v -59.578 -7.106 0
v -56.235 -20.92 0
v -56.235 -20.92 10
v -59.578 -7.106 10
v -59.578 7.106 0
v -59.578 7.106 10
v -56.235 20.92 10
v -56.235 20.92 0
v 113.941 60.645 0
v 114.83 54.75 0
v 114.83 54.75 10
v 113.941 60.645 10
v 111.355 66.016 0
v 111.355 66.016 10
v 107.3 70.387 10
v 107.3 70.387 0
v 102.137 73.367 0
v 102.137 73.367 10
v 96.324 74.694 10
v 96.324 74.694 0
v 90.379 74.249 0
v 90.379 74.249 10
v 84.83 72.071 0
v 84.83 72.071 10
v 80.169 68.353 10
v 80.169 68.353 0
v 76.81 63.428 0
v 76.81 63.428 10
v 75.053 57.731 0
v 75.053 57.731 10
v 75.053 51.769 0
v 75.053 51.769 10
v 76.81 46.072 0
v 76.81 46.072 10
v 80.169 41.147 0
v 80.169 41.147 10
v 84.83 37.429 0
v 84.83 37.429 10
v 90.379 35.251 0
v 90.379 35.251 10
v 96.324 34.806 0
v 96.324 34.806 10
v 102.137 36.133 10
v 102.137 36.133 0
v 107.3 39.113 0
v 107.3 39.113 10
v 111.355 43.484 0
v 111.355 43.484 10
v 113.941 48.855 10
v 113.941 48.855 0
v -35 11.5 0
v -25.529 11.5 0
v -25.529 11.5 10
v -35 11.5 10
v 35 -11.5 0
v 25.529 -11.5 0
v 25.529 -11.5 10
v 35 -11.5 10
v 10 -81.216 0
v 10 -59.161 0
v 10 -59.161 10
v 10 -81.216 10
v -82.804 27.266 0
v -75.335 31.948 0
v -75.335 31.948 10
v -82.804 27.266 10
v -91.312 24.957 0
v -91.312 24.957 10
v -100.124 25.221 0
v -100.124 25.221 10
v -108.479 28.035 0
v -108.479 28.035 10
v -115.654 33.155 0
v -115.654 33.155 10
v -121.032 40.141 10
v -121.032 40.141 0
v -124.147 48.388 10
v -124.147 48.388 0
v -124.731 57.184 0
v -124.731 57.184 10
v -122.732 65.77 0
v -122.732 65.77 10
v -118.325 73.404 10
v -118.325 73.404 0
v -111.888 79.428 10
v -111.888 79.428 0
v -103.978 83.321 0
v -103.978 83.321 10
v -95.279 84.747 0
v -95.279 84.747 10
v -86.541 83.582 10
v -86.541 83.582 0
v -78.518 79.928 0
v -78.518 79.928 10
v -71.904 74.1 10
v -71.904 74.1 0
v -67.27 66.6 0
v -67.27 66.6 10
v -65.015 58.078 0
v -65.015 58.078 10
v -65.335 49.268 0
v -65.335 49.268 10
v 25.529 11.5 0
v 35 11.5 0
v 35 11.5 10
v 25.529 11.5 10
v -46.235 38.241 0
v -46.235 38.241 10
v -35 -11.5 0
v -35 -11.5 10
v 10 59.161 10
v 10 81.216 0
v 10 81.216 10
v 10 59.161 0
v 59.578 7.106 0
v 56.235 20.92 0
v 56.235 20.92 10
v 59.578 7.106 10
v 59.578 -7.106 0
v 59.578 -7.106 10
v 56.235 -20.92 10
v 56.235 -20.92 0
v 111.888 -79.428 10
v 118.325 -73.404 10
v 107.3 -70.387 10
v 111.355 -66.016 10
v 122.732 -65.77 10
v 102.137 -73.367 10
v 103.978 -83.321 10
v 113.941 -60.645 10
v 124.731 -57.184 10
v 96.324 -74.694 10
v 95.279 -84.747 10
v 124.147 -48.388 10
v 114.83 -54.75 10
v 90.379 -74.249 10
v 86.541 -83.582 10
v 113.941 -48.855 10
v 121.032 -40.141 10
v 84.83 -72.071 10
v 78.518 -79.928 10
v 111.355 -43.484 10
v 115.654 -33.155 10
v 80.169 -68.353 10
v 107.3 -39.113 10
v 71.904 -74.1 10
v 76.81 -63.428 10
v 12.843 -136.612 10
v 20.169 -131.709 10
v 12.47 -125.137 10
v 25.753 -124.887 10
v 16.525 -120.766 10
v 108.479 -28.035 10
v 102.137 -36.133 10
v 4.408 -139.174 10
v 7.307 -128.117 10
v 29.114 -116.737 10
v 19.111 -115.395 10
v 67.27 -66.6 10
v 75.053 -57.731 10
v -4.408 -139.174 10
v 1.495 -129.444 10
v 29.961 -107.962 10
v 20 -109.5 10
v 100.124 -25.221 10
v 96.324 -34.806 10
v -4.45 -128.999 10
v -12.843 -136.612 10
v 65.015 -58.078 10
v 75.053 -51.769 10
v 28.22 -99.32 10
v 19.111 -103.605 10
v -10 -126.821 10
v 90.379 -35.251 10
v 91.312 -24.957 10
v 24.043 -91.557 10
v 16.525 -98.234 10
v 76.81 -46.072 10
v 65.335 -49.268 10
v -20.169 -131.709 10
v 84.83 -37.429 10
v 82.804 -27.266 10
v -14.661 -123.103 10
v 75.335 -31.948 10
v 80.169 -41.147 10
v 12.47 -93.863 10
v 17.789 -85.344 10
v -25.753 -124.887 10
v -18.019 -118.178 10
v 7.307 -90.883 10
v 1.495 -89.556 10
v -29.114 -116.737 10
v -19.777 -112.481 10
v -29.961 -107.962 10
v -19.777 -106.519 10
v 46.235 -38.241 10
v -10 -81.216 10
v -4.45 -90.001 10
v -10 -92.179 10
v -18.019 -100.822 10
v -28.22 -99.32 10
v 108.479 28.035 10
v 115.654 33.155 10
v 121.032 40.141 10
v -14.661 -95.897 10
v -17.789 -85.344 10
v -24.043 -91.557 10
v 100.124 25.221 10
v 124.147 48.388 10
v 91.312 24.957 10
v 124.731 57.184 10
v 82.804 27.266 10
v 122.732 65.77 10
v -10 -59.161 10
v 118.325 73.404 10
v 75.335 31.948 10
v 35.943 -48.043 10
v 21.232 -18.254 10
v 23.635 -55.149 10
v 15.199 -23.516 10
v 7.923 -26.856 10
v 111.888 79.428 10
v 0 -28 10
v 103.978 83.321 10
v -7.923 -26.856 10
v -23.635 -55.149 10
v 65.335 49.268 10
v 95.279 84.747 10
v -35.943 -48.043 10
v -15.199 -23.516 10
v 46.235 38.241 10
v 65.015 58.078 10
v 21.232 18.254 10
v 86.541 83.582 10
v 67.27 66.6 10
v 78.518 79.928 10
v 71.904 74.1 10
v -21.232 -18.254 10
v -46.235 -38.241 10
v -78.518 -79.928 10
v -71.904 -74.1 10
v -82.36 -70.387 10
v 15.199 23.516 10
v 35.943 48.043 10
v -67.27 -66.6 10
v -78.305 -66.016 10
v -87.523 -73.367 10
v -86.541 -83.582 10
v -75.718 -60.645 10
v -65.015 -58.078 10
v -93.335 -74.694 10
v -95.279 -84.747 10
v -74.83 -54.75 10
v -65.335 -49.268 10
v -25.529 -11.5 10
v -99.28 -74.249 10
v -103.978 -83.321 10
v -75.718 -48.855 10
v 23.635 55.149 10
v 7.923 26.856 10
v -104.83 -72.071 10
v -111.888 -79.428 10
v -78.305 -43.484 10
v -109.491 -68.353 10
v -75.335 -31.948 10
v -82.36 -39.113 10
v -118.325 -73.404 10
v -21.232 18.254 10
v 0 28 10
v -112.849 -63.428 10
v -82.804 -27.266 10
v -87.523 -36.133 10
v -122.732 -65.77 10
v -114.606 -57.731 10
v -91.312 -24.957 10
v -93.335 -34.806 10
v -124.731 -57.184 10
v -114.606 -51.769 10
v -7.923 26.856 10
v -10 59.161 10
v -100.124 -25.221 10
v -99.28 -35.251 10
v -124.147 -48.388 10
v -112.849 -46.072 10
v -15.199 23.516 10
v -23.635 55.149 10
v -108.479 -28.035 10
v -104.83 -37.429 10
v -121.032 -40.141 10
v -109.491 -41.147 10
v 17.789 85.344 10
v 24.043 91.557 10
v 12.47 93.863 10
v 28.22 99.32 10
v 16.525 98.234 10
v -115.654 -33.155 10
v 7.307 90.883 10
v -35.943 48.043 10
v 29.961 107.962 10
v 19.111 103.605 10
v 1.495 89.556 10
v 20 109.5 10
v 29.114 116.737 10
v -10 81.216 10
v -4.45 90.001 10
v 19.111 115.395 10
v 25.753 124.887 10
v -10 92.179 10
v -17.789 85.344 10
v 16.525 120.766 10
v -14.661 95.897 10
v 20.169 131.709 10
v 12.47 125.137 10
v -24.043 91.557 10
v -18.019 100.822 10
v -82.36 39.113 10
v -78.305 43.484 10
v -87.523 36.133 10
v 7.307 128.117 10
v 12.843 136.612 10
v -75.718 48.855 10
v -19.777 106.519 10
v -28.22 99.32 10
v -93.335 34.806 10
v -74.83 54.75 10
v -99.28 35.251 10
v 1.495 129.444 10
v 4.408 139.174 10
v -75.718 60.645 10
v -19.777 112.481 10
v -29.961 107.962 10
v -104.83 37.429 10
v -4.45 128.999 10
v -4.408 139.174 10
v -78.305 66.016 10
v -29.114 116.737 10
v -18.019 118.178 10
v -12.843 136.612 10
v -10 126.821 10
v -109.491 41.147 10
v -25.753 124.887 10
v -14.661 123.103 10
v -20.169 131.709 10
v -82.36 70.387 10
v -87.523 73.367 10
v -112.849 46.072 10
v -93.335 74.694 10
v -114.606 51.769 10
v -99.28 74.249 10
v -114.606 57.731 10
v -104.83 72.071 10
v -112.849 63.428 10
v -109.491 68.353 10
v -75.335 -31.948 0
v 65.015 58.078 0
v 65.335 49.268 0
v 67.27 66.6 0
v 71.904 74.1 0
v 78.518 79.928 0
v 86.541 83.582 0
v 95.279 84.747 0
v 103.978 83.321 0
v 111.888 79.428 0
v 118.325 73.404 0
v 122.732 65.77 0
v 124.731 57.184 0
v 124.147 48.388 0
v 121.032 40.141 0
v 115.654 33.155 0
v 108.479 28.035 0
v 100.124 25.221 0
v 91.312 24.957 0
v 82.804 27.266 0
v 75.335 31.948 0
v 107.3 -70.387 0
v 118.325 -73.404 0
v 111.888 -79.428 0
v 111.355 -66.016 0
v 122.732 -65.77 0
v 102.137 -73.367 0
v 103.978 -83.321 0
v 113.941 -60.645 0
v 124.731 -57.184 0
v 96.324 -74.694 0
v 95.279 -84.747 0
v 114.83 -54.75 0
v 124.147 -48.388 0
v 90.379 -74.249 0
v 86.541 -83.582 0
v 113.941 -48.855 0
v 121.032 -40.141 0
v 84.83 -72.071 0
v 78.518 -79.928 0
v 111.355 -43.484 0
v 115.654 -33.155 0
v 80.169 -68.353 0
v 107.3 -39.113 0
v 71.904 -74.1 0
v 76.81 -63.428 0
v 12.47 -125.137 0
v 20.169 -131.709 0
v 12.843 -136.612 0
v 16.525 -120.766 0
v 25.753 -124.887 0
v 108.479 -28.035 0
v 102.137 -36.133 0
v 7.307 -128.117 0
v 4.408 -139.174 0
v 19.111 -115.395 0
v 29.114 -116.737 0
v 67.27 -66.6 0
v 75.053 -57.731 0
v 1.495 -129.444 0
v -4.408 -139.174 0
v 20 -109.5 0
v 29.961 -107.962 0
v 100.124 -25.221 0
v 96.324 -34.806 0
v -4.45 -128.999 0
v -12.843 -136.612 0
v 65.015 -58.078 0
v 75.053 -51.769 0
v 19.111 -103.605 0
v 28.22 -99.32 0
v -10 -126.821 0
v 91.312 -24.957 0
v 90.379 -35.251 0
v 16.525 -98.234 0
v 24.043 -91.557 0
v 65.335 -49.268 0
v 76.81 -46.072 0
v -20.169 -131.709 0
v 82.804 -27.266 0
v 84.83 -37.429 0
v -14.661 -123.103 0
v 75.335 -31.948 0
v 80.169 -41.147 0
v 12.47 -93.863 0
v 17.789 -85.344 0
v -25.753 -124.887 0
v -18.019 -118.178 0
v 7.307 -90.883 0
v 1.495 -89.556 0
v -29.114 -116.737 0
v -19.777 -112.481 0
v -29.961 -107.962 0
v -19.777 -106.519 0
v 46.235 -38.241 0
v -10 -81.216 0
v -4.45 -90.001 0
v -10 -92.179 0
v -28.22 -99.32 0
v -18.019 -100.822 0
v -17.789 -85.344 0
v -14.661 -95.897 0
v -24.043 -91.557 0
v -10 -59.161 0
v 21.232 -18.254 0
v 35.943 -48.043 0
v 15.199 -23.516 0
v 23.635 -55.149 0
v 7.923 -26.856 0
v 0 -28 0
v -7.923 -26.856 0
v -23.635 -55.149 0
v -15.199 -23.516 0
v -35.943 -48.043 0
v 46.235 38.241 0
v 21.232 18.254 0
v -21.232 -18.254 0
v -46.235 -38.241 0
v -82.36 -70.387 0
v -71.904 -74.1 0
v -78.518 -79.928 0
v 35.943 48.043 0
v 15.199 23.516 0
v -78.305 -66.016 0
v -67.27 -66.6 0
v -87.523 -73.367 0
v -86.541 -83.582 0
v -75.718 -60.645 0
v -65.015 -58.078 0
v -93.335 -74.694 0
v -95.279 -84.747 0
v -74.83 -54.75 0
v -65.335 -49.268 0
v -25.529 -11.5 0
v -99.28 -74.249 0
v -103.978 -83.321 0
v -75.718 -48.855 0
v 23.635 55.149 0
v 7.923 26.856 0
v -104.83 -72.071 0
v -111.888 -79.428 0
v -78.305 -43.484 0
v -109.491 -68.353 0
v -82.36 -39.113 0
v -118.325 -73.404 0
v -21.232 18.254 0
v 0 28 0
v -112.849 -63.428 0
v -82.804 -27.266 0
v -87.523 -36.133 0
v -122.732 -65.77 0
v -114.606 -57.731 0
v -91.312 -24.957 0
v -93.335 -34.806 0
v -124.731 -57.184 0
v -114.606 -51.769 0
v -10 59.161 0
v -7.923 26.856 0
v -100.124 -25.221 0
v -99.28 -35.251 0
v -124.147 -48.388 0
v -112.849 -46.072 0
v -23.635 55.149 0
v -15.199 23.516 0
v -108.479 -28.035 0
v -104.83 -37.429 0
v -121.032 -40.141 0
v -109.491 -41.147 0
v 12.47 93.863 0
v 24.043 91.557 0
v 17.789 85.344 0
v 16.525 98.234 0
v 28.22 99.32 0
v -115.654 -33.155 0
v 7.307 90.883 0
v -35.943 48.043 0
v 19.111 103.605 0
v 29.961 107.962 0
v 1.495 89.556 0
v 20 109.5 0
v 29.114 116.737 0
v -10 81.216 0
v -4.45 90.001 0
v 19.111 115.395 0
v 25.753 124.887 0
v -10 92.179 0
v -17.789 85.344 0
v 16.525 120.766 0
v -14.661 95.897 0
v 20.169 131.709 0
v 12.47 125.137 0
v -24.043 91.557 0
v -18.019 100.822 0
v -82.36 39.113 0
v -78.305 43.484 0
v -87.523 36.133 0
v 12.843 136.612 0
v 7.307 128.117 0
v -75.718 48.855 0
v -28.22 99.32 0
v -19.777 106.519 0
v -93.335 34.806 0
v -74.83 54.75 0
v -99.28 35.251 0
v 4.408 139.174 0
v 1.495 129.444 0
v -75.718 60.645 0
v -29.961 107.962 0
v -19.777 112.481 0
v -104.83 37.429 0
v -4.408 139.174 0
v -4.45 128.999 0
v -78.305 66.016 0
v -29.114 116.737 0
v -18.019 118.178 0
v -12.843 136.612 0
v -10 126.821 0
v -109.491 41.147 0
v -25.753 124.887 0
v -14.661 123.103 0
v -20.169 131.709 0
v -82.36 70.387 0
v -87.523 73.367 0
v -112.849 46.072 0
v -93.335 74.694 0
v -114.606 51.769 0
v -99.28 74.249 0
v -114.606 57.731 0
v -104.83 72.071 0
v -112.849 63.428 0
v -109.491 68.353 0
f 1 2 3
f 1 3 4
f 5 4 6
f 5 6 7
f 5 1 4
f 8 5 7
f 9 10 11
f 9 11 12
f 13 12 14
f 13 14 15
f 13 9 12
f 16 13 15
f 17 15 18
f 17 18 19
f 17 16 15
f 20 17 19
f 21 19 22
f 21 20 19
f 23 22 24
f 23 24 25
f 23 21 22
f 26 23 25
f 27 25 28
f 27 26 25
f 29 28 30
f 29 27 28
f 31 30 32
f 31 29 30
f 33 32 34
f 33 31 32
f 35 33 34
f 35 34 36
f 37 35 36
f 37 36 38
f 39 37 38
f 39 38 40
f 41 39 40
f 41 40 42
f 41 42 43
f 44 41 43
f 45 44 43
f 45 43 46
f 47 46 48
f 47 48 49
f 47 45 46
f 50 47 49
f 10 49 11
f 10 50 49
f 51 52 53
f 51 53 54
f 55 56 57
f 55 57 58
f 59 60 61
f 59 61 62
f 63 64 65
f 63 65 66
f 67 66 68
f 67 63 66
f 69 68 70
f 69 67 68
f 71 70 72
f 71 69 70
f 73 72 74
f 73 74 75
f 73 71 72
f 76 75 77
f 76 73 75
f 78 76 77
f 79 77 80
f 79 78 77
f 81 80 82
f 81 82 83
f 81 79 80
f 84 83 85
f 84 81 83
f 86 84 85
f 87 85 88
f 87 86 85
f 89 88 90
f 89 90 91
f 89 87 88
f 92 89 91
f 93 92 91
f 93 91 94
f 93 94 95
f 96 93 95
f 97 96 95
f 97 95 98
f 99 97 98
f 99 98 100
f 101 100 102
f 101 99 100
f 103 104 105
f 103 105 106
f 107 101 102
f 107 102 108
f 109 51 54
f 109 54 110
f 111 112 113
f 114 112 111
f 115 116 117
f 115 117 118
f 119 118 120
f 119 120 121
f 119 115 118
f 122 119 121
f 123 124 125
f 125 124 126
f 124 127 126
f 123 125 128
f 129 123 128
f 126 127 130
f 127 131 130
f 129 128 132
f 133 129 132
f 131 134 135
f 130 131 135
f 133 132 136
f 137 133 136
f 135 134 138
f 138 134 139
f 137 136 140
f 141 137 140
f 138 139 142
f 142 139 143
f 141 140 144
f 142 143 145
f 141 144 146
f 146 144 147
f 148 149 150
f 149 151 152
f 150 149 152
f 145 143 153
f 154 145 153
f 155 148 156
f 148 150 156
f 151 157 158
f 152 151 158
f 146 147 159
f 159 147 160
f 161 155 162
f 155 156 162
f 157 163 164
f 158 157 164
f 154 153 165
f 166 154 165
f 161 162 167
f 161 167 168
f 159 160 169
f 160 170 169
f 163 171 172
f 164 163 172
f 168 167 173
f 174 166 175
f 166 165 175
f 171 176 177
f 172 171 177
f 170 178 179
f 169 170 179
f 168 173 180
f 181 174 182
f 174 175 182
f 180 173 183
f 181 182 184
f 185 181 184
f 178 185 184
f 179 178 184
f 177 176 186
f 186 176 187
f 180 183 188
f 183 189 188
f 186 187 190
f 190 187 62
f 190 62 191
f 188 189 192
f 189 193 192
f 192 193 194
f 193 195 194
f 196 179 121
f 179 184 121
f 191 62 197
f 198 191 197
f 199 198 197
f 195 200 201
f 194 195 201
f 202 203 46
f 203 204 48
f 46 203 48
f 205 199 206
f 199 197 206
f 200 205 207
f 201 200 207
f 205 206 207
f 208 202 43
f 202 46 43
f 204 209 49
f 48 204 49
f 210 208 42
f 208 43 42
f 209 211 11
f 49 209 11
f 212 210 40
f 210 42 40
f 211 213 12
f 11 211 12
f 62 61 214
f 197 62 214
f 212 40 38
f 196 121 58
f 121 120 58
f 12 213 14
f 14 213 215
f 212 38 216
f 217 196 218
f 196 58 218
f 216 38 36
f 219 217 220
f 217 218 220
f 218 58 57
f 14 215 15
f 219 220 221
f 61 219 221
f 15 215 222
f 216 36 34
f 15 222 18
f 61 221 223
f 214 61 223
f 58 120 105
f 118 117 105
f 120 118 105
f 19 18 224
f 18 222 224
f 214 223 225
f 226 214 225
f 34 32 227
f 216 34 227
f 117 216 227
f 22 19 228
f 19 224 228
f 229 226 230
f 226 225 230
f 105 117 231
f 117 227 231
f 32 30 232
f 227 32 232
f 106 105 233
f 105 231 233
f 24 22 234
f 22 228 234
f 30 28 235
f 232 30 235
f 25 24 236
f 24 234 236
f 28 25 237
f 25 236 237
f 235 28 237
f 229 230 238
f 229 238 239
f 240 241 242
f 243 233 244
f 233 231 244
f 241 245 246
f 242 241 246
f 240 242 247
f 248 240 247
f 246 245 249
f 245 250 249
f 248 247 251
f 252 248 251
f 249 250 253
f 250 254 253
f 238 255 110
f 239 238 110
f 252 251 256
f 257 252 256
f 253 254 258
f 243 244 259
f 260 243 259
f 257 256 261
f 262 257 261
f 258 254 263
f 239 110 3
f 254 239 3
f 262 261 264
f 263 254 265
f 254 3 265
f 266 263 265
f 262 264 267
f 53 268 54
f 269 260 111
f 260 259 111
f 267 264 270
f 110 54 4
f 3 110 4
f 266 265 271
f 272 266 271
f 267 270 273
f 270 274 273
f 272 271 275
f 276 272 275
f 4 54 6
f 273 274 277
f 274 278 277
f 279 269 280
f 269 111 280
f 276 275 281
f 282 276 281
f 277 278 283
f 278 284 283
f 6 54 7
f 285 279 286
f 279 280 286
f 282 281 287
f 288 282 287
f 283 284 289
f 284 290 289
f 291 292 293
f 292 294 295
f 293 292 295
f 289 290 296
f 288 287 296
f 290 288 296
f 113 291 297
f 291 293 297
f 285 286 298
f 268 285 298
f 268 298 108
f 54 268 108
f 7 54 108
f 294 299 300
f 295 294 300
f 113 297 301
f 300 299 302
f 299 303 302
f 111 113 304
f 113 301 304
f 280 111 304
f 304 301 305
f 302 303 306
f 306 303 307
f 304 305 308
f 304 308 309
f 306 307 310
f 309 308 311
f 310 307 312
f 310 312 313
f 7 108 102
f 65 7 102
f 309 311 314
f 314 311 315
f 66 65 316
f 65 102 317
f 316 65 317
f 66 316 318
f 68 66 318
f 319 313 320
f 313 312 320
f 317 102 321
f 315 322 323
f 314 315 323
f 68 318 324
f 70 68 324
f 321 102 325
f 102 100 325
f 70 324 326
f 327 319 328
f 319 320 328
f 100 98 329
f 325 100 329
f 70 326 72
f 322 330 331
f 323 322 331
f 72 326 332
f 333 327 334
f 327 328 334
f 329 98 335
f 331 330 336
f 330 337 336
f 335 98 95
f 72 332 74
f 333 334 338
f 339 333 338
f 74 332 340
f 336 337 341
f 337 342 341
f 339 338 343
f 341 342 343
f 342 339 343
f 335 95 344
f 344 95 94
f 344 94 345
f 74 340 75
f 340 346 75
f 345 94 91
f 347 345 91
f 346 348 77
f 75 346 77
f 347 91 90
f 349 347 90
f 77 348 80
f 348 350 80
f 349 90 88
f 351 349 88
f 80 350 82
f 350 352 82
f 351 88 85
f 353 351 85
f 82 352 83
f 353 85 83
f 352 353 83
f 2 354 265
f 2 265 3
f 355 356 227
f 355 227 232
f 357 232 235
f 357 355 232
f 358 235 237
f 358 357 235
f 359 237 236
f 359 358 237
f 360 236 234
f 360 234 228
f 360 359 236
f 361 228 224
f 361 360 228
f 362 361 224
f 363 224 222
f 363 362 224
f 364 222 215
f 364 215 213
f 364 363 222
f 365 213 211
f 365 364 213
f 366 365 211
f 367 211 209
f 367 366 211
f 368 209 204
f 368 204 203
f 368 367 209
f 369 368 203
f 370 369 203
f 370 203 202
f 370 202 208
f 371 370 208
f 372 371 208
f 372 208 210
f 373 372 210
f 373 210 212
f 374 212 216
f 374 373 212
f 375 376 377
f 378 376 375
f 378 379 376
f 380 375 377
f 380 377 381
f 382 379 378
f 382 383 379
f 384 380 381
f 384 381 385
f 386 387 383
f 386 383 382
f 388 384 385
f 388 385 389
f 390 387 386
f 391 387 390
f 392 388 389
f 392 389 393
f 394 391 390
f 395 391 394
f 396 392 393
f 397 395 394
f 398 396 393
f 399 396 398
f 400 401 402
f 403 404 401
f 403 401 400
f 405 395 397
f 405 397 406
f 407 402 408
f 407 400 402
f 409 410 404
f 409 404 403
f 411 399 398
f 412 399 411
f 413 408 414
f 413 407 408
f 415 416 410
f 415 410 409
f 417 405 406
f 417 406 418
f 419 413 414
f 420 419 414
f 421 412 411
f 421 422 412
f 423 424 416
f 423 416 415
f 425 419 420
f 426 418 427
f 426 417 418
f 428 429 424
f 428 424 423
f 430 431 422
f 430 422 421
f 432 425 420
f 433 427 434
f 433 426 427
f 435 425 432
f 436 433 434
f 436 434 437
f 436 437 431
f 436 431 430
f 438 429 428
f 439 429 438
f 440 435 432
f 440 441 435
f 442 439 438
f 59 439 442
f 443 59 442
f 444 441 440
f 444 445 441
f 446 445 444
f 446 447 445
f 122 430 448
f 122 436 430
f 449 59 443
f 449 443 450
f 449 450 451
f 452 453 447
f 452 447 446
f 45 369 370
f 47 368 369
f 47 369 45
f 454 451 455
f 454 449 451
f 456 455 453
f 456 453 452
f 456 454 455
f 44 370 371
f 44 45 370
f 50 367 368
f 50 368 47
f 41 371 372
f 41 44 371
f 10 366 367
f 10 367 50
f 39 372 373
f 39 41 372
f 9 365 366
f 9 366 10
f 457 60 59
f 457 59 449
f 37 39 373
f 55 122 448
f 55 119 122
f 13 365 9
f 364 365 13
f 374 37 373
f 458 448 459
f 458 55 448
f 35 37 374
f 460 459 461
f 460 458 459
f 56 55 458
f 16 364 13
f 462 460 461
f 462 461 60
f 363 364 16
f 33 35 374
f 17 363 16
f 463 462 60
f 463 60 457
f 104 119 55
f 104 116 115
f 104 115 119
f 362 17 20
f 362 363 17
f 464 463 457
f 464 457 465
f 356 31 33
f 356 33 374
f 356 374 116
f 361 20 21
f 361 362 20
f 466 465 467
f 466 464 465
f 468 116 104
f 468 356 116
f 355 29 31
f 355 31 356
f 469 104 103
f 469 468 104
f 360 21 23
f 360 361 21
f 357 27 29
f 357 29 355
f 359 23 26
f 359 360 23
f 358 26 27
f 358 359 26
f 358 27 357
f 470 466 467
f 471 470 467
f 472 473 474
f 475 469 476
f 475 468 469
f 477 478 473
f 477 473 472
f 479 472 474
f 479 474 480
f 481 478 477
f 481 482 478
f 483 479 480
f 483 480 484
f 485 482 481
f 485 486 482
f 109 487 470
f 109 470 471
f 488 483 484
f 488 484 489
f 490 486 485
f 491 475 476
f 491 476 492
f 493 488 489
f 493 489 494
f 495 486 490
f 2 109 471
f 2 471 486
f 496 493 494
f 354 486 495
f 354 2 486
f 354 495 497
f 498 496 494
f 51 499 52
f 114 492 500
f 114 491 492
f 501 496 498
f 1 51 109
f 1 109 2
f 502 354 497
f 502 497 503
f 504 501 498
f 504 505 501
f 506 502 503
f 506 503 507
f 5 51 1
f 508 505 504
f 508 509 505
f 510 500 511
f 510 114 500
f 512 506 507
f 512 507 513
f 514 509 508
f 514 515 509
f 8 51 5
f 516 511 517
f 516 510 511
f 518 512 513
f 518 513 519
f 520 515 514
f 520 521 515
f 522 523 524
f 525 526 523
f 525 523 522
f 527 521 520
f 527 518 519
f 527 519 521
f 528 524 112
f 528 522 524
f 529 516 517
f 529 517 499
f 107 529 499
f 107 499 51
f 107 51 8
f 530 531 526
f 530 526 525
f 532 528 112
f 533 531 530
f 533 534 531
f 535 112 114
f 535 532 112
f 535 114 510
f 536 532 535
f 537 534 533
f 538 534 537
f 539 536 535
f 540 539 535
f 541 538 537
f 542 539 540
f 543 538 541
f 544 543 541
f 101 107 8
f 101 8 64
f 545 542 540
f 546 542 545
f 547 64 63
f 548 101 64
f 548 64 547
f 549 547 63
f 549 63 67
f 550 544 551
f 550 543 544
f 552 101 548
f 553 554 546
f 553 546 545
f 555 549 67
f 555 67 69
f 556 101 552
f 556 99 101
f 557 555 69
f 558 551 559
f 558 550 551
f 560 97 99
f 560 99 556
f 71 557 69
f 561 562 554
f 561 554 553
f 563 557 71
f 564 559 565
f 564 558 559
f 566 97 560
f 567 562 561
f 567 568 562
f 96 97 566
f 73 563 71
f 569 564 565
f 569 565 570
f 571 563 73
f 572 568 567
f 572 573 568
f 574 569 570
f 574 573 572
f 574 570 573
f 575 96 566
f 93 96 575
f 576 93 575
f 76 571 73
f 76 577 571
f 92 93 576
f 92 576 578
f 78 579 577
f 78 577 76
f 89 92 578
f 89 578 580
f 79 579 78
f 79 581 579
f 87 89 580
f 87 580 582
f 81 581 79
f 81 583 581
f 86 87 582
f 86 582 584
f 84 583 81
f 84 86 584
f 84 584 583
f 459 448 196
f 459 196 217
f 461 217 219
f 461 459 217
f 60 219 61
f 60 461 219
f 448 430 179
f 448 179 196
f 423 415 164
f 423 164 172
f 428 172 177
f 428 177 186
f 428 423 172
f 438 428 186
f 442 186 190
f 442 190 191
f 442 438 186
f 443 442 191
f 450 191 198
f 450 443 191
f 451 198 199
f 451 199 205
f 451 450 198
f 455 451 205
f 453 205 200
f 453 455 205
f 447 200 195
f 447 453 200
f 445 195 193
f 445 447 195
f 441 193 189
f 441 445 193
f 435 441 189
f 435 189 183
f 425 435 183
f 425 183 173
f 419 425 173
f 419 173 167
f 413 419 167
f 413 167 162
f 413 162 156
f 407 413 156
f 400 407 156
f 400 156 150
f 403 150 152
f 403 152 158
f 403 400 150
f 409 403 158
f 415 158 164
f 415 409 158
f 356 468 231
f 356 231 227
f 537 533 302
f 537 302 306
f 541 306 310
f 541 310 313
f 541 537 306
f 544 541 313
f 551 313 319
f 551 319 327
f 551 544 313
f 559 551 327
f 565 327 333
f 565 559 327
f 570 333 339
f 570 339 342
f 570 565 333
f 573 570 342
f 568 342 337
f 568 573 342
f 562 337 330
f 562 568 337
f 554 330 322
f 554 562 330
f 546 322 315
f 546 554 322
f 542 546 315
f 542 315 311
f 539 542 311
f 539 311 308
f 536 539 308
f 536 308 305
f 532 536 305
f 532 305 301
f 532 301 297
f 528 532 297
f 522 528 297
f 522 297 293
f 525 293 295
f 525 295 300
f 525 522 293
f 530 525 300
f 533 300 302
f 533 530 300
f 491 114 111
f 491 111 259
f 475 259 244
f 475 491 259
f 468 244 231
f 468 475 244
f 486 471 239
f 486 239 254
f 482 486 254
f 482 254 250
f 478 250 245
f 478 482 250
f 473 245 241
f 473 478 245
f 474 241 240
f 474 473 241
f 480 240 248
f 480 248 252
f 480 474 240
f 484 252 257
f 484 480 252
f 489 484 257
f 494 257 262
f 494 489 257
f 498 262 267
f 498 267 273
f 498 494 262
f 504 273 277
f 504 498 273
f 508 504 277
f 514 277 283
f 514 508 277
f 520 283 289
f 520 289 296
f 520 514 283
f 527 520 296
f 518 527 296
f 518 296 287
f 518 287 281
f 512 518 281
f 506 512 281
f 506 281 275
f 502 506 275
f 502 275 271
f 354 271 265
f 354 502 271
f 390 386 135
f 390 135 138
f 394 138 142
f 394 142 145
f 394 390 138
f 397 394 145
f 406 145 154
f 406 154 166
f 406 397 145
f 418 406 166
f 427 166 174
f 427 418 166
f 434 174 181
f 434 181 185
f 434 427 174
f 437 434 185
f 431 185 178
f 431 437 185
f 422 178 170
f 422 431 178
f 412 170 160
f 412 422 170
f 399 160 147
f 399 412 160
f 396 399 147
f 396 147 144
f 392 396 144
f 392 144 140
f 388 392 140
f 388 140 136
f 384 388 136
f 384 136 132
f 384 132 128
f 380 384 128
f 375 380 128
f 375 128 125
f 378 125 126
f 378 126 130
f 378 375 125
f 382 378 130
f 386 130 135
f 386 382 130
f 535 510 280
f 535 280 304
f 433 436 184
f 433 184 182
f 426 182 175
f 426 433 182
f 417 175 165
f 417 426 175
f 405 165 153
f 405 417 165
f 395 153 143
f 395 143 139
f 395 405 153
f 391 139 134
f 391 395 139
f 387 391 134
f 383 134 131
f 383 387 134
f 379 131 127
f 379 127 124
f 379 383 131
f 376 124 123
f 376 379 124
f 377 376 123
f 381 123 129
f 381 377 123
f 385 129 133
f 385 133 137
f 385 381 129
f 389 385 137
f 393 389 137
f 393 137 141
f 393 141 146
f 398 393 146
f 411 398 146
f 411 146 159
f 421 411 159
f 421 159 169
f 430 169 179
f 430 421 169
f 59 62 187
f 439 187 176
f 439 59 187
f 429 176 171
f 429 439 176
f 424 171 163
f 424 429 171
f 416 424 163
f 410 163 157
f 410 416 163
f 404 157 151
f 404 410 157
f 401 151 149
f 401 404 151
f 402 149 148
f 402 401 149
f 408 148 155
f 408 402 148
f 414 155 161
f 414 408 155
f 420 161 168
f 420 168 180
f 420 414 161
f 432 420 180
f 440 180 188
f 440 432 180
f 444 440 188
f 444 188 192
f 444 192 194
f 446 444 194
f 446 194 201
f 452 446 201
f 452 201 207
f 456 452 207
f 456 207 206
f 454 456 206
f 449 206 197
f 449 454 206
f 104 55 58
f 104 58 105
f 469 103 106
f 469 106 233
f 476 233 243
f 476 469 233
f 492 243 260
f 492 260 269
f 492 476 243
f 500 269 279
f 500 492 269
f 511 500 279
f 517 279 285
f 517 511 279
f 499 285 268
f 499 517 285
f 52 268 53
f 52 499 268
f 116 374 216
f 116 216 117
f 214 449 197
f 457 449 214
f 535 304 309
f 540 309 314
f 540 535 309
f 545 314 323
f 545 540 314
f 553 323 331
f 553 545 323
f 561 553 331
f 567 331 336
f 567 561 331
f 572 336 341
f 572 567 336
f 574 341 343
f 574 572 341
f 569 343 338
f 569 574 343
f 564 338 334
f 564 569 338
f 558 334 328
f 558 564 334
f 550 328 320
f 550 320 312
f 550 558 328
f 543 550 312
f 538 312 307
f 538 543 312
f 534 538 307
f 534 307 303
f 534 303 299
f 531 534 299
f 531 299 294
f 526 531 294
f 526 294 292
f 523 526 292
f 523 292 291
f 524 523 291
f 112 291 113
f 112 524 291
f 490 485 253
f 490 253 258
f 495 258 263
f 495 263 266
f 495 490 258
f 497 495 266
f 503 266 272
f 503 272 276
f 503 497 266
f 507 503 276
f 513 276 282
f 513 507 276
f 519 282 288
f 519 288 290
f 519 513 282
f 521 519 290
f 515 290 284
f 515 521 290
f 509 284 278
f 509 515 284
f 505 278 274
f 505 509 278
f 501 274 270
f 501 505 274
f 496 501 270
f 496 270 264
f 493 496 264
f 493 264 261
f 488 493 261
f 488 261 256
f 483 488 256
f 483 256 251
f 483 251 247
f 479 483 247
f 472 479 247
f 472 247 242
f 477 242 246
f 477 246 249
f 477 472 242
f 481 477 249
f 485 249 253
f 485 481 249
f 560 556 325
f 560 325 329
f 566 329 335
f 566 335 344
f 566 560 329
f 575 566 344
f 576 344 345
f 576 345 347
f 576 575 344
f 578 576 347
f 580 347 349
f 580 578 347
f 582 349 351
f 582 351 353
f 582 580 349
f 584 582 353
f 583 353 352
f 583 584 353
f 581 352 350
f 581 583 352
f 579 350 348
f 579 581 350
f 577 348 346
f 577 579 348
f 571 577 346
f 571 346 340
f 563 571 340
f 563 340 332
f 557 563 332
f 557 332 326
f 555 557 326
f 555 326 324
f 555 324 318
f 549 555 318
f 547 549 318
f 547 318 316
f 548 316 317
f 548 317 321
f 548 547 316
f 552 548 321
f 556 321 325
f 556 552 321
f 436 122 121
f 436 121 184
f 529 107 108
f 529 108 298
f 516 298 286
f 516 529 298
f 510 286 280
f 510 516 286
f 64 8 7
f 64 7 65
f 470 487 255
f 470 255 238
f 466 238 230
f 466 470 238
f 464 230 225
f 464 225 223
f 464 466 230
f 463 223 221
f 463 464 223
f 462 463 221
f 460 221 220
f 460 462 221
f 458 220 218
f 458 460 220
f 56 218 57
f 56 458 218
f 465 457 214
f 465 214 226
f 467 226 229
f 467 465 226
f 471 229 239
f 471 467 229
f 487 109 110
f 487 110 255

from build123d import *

# Parameters (mm, degrees)
SKETCH1_R           = 20
BOSS_EXTRUDE1_DEPTH = 10


with BuildPart() as part:
    # Sketch1 → Boss-Extrude1 (new body)
    with BuildSketch(Plane.XY):
        with BuildLine():
            Line((56.23475383, -20.920144878), (75.334884287, -31.947610338))
            ThreePointArc((75.334884287, -31.947610338), (120.810543828, -69.75), (65.334884287, -49.268118414))
            Line((65.334884287, -49.268118414), (46.23475383, -38.240652953))
            ThreePointArc((46.23475383, -38.240652953), (30, -51.961524227), (10, -59.160797831))
            Line((10, -59.160797831), (10, -81.215728753))
            ThreePointArc((10, -81.215728753), (0, -139.5), (-10, -81.215728753))
            Line((-10, -81.215728753), (-10, -59.160797831))
            ThreePointArc((-10, -59.160797831), (-30, -51.961524227), (-46.23475383, -38.240652953))
            Line((-46.23475383, -38.240652953), (-65.334884287, -49.268118414))
            ThreePointArc((-65.334884287, -49.268118414), (-120.810543828, -69.75), (-75.334884287, -31.947610338))
            Line((-75.334884287, -31.947610338), (-56.23475383, -20.920144878))
            ThreePointArc((-56.23475383, -20.920144878), (-60, 0), (-56.23475383, 20.920144878))
            Line((-56.23475383, 20.920144878), (-75.334884287, 31.947610338))
            ThreePointArc((-75.334884287, 31.947610338), (-120.810543828, 69.75), (-65.334884287, 49.268118414))
            Line((-65.334884287, 49.268118414), (-46.23475383, 38.240652953))
            ThreePointArc((-46.23475383, 38.240652953), (-30, 51.961524227), (-10, 59.160797831))
            Line((-10, 59.160797831), (-10, 81.215728753))
            ThreePointArc((-10, 81.215728753), (0, 139.5), (10, 81.215728753))
            Line((10, 81.215728753), (10, 59.160797831))
            ThreePointArc((10, 59.160797831), (30, 51.961524227), (46.23475383, 38.240652953))
            Line((46.23475383, 38.240652953), (65.334884287, 49.268118414))
            ThreePointArc((65.334884287, 49.268118414), (120.810543828, 69.75), (75.334884287, 31.947610338))
            Line((75.334884287, 31.947610338), (56.23475383, 20.920144878))
            ThreePointArc((56.23475383, 20.920144878), (60, 0), (56.23475383, -20.920144878))
        make_face()
        with Locations((94.829781714, 54.75)):
            Circle(SKETCH1_R, mode=Mode.SUBTRACT)
        with Locations((94.829781714, -54.75)):
            Circle(SKETCH1_R, mode=Mode.SUBTRACT)
        with Locations((0, -109.5)):
            Circle(SKETCH1_R, mode=Mode.SUBTRACT)
        with Locations((-94.829781714, -54.75)):
            Circle(SKETCH1_R, mode=Mode.SUBTRACT)
        with Locations((-94.829781714, 54.75)):
            Circle(SKETCH1_R, mode=Mode.SUBTRACT)
        with Locations((0, 109.5)):
            Circle(SKETCH1_R, mode=Mode.SUBTRACT)
        with BuildLine():
            ThreePointArc((25.529394822, 11.5), (0, 28), (-25.529394822, 11.5))
            Line((-25.529394822, 11.5), (-35, 11.5))
            Line((-35, 11.5), (-35, -11.5))
            Line((-35, -11.5), (-25.529394822, -11.5))
            ThreePointArc((-25.529394822, -11.5), (0, -28), (25.529394822, -11.5))
            Line((25.529394822, -11.5), (35, -11.5))
            Line((35, -11.5), (35, 11.5))
            Line((35, 11.5), (25.529394822, 11.5))
        make_face(mode=Mode.SUBTRACT)
    extrude(amount=BOSS_EXTRUDE1_DEPTH)


solid = part.part
